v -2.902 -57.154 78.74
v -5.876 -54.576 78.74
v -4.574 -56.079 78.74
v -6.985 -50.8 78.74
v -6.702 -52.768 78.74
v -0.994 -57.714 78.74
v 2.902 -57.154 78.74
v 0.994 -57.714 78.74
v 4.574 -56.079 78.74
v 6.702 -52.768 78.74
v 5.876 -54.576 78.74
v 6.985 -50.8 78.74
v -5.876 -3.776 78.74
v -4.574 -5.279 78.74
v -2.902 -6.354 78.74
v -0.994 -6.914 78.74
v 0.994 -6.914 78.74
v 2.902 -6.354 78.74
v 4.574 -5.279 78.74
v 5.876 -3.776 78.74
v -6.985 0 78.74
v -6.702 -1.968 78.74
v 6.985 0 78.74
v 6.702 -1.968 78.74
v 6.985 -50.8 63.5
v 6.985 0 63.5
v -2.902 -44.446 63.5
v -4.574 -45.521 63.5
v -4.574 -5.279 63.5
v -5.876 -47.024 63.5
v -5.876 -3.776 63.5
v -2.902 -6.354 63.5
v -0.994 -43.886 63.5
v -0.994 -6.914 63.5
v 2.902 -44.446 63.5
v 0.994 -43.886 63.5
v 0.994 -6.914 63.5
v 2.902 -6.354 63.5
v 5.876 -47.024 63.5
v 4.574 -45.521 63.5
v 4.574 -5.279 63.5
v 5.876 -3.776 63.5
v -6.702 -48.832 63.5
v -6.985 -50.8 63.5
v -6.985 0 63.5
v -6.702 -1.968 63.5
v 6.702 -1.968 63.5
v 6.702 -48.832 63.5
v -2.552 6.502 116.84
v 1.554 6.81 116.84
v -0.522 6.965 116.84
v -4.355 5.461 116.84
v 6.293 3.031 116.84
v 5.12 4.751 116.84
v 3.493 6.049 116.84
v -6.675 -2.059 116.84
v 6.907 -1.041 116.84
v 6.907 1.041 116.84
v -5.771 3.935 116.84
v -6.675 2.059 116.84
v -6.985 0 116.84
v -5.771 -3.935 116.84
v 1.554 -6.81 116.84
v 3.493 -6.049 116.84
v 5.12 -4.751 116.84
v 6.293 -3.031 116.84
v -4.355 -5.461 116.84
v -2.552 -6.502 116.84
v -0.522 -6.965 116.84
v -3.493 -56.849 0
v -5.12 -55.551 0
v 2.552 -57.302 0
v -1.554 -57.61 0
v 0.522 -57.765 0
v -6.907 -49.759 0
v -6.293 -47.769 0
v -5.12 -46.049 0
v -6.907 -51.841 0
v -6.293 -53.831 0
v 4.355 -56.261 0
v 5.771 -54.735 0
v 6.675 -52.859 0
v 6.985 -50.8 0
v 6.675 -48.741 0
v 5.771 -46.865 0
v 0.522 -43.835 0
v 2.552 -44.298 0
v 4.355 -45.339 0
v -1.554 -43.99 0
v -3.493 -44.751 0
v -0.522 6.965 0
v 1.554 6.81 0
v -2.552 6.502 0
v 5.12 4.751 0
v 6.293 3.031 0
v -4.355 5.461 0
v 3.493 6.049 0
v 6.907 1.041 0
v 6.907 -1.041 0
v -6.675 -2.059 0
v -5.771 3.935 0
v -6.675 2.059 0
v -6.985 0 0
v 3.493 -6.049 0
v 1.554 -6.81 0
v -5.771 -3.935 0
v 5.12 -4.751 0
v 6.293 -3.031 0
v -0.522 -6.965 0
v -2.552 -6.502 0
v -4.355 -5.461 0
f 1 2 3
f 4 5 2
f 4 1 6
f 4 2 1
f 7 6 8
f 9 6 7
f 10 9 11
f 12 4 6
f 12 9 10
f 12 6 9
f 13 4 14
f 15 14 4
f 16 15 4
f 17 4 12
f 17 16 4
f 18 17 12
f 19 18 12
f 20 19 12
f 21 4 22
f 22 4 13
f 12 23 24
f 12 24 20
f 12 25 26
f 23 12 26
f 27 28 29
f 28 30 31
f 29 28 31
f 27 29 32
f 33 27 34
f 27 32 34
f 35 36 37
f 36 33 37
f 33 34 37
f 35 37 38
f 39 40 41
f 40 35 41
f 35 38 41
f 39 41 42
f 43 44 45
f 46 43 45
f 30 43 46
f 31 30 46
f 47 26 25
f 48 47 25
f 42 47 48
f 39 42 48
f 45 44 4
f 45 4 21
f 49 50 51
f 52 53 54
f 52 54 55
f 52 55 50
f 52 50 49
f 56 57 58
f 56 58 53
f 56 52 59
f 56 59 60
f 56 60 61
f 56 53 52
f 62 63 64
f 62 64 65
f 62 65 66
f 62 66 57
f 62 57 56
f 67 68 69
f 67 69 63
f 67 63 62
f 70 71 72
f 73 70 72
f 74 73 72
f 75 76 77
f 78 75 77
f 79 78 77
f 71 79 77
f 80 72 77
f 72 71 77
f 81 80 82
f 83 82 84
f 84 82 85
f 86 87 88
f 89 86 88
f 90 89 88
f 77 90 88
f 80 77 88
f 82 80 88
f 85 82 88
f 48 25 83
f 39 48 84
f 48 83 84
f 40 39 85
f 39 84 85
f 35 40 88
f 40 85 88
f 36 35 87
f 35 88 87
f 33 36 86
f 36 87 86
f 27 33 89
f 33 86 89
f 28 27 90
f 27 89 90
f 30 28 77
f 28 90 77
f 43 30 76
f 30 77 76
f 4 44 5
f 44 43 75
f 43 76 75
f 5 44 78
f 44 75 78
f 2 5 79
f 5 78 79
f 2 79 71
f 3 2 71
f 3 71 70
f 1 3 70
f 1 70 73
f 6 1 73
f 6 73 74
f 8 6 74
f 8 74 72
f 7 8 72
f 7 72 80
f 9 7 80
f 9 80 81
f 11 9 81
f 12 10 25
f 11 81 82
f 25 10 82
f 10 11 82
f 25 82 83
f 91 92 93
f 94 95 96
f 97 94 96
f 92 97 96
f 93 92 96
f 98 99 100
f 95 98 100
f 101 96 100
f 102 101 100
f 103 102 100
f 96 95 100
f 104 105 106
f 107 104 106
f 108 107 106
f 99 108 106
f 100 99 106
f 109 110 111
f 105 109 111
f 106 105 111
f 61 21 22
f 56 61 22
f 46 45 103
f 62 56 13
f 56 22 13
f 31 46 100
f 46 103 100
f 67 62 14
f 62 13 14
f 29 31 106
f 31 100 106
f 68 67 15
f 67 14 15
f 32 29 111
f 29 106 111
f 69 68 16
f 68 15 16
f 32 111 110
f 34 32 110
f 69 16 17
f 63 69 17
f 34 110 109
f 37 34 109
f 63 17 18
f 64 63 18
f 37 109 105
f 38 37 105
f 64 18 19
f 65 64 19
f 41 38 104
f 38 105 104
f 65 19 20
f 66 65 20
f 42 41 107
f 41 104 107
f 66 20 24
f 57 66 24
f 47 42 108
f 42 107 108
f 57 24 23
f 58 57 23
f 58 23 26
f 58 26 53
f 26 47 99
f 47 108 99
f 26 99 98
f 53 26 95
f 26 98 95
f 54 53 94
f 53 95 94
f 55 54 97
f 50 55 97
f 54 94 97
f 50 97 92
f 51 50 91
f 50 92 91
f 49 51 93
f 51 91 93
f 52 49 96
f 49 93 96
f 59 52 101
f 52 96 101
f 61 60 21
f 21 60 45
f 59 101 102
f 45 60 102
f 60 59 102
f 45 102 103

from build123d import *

# Parameters (mm, degrees)
BOSS_EXTRUDE11_DEPTH = 116.84
BOSS_EXTRUDE12_DEPTH = 63.5
SKETCH19_W           = 13.97
SKETCH19_H           = 50.8
BOSS_EXTRUDE13_DEPTH = 15.24
SKETCH21_R           = 6.985
BOSS_EXTRUDE15_DEPTH = 15.24


with BuildPart() as part:
    # Sketch2 → Boss-Extrude11 (new body)
    with BuildSketch(Plane.XY):
        with BuildLine():
            ThreePointArc((6.985, 0), (-4.939140867, 4.939140867), (0, -6.985))
            ThreePointArc((0, -6.985), (4.939140867, -4.939140867), (6.985, 0))
        make_face()
    extrude(amount=BOSS_EXTRUDE11_DEPTH)



with BuildPart() as body_2:
    # Sketch2<4> → Boss-Extrude12 (new body)
    with BuildSketch(Plane.XY):
        with BuildLine():
            ThreePointArc((6.985, -50.8), (4.939140867, -45.860859133), (0, -43.815))
            ThreePointArc((0, -43.815), (-4.939140867, -55.739140867), (6.985, -50.8))
        make_face()
    extrude(amount=BOSS_EXTRUDE12_DEPTH)


with BuildPart() as part_1:
    add(part.part)

    add(body_2.part)  # Boss-Extrude13 merges body 2
    # Sketch19 → Boss-Extrude13 (add)
    with BuildSketch(Plane.XY.offset(63.5)):
        with Locations((0, -25.4)):
            Rectangle(SKETCH19_W, SKETCH19_H)
    extrude(amount=BOSS_EXTRUDE13_DEPTH)

    # Sketch21 → Boss-Extrude15 (add)
    with BuildSketch(Plane.XY.offset(63.5)):
        with Locations((0, -50.8)):
            Circle(SKETCH21_R)
    extrude(amount=BOSS_EXTRUDE15_DEPTH)


solid = part_1.part
